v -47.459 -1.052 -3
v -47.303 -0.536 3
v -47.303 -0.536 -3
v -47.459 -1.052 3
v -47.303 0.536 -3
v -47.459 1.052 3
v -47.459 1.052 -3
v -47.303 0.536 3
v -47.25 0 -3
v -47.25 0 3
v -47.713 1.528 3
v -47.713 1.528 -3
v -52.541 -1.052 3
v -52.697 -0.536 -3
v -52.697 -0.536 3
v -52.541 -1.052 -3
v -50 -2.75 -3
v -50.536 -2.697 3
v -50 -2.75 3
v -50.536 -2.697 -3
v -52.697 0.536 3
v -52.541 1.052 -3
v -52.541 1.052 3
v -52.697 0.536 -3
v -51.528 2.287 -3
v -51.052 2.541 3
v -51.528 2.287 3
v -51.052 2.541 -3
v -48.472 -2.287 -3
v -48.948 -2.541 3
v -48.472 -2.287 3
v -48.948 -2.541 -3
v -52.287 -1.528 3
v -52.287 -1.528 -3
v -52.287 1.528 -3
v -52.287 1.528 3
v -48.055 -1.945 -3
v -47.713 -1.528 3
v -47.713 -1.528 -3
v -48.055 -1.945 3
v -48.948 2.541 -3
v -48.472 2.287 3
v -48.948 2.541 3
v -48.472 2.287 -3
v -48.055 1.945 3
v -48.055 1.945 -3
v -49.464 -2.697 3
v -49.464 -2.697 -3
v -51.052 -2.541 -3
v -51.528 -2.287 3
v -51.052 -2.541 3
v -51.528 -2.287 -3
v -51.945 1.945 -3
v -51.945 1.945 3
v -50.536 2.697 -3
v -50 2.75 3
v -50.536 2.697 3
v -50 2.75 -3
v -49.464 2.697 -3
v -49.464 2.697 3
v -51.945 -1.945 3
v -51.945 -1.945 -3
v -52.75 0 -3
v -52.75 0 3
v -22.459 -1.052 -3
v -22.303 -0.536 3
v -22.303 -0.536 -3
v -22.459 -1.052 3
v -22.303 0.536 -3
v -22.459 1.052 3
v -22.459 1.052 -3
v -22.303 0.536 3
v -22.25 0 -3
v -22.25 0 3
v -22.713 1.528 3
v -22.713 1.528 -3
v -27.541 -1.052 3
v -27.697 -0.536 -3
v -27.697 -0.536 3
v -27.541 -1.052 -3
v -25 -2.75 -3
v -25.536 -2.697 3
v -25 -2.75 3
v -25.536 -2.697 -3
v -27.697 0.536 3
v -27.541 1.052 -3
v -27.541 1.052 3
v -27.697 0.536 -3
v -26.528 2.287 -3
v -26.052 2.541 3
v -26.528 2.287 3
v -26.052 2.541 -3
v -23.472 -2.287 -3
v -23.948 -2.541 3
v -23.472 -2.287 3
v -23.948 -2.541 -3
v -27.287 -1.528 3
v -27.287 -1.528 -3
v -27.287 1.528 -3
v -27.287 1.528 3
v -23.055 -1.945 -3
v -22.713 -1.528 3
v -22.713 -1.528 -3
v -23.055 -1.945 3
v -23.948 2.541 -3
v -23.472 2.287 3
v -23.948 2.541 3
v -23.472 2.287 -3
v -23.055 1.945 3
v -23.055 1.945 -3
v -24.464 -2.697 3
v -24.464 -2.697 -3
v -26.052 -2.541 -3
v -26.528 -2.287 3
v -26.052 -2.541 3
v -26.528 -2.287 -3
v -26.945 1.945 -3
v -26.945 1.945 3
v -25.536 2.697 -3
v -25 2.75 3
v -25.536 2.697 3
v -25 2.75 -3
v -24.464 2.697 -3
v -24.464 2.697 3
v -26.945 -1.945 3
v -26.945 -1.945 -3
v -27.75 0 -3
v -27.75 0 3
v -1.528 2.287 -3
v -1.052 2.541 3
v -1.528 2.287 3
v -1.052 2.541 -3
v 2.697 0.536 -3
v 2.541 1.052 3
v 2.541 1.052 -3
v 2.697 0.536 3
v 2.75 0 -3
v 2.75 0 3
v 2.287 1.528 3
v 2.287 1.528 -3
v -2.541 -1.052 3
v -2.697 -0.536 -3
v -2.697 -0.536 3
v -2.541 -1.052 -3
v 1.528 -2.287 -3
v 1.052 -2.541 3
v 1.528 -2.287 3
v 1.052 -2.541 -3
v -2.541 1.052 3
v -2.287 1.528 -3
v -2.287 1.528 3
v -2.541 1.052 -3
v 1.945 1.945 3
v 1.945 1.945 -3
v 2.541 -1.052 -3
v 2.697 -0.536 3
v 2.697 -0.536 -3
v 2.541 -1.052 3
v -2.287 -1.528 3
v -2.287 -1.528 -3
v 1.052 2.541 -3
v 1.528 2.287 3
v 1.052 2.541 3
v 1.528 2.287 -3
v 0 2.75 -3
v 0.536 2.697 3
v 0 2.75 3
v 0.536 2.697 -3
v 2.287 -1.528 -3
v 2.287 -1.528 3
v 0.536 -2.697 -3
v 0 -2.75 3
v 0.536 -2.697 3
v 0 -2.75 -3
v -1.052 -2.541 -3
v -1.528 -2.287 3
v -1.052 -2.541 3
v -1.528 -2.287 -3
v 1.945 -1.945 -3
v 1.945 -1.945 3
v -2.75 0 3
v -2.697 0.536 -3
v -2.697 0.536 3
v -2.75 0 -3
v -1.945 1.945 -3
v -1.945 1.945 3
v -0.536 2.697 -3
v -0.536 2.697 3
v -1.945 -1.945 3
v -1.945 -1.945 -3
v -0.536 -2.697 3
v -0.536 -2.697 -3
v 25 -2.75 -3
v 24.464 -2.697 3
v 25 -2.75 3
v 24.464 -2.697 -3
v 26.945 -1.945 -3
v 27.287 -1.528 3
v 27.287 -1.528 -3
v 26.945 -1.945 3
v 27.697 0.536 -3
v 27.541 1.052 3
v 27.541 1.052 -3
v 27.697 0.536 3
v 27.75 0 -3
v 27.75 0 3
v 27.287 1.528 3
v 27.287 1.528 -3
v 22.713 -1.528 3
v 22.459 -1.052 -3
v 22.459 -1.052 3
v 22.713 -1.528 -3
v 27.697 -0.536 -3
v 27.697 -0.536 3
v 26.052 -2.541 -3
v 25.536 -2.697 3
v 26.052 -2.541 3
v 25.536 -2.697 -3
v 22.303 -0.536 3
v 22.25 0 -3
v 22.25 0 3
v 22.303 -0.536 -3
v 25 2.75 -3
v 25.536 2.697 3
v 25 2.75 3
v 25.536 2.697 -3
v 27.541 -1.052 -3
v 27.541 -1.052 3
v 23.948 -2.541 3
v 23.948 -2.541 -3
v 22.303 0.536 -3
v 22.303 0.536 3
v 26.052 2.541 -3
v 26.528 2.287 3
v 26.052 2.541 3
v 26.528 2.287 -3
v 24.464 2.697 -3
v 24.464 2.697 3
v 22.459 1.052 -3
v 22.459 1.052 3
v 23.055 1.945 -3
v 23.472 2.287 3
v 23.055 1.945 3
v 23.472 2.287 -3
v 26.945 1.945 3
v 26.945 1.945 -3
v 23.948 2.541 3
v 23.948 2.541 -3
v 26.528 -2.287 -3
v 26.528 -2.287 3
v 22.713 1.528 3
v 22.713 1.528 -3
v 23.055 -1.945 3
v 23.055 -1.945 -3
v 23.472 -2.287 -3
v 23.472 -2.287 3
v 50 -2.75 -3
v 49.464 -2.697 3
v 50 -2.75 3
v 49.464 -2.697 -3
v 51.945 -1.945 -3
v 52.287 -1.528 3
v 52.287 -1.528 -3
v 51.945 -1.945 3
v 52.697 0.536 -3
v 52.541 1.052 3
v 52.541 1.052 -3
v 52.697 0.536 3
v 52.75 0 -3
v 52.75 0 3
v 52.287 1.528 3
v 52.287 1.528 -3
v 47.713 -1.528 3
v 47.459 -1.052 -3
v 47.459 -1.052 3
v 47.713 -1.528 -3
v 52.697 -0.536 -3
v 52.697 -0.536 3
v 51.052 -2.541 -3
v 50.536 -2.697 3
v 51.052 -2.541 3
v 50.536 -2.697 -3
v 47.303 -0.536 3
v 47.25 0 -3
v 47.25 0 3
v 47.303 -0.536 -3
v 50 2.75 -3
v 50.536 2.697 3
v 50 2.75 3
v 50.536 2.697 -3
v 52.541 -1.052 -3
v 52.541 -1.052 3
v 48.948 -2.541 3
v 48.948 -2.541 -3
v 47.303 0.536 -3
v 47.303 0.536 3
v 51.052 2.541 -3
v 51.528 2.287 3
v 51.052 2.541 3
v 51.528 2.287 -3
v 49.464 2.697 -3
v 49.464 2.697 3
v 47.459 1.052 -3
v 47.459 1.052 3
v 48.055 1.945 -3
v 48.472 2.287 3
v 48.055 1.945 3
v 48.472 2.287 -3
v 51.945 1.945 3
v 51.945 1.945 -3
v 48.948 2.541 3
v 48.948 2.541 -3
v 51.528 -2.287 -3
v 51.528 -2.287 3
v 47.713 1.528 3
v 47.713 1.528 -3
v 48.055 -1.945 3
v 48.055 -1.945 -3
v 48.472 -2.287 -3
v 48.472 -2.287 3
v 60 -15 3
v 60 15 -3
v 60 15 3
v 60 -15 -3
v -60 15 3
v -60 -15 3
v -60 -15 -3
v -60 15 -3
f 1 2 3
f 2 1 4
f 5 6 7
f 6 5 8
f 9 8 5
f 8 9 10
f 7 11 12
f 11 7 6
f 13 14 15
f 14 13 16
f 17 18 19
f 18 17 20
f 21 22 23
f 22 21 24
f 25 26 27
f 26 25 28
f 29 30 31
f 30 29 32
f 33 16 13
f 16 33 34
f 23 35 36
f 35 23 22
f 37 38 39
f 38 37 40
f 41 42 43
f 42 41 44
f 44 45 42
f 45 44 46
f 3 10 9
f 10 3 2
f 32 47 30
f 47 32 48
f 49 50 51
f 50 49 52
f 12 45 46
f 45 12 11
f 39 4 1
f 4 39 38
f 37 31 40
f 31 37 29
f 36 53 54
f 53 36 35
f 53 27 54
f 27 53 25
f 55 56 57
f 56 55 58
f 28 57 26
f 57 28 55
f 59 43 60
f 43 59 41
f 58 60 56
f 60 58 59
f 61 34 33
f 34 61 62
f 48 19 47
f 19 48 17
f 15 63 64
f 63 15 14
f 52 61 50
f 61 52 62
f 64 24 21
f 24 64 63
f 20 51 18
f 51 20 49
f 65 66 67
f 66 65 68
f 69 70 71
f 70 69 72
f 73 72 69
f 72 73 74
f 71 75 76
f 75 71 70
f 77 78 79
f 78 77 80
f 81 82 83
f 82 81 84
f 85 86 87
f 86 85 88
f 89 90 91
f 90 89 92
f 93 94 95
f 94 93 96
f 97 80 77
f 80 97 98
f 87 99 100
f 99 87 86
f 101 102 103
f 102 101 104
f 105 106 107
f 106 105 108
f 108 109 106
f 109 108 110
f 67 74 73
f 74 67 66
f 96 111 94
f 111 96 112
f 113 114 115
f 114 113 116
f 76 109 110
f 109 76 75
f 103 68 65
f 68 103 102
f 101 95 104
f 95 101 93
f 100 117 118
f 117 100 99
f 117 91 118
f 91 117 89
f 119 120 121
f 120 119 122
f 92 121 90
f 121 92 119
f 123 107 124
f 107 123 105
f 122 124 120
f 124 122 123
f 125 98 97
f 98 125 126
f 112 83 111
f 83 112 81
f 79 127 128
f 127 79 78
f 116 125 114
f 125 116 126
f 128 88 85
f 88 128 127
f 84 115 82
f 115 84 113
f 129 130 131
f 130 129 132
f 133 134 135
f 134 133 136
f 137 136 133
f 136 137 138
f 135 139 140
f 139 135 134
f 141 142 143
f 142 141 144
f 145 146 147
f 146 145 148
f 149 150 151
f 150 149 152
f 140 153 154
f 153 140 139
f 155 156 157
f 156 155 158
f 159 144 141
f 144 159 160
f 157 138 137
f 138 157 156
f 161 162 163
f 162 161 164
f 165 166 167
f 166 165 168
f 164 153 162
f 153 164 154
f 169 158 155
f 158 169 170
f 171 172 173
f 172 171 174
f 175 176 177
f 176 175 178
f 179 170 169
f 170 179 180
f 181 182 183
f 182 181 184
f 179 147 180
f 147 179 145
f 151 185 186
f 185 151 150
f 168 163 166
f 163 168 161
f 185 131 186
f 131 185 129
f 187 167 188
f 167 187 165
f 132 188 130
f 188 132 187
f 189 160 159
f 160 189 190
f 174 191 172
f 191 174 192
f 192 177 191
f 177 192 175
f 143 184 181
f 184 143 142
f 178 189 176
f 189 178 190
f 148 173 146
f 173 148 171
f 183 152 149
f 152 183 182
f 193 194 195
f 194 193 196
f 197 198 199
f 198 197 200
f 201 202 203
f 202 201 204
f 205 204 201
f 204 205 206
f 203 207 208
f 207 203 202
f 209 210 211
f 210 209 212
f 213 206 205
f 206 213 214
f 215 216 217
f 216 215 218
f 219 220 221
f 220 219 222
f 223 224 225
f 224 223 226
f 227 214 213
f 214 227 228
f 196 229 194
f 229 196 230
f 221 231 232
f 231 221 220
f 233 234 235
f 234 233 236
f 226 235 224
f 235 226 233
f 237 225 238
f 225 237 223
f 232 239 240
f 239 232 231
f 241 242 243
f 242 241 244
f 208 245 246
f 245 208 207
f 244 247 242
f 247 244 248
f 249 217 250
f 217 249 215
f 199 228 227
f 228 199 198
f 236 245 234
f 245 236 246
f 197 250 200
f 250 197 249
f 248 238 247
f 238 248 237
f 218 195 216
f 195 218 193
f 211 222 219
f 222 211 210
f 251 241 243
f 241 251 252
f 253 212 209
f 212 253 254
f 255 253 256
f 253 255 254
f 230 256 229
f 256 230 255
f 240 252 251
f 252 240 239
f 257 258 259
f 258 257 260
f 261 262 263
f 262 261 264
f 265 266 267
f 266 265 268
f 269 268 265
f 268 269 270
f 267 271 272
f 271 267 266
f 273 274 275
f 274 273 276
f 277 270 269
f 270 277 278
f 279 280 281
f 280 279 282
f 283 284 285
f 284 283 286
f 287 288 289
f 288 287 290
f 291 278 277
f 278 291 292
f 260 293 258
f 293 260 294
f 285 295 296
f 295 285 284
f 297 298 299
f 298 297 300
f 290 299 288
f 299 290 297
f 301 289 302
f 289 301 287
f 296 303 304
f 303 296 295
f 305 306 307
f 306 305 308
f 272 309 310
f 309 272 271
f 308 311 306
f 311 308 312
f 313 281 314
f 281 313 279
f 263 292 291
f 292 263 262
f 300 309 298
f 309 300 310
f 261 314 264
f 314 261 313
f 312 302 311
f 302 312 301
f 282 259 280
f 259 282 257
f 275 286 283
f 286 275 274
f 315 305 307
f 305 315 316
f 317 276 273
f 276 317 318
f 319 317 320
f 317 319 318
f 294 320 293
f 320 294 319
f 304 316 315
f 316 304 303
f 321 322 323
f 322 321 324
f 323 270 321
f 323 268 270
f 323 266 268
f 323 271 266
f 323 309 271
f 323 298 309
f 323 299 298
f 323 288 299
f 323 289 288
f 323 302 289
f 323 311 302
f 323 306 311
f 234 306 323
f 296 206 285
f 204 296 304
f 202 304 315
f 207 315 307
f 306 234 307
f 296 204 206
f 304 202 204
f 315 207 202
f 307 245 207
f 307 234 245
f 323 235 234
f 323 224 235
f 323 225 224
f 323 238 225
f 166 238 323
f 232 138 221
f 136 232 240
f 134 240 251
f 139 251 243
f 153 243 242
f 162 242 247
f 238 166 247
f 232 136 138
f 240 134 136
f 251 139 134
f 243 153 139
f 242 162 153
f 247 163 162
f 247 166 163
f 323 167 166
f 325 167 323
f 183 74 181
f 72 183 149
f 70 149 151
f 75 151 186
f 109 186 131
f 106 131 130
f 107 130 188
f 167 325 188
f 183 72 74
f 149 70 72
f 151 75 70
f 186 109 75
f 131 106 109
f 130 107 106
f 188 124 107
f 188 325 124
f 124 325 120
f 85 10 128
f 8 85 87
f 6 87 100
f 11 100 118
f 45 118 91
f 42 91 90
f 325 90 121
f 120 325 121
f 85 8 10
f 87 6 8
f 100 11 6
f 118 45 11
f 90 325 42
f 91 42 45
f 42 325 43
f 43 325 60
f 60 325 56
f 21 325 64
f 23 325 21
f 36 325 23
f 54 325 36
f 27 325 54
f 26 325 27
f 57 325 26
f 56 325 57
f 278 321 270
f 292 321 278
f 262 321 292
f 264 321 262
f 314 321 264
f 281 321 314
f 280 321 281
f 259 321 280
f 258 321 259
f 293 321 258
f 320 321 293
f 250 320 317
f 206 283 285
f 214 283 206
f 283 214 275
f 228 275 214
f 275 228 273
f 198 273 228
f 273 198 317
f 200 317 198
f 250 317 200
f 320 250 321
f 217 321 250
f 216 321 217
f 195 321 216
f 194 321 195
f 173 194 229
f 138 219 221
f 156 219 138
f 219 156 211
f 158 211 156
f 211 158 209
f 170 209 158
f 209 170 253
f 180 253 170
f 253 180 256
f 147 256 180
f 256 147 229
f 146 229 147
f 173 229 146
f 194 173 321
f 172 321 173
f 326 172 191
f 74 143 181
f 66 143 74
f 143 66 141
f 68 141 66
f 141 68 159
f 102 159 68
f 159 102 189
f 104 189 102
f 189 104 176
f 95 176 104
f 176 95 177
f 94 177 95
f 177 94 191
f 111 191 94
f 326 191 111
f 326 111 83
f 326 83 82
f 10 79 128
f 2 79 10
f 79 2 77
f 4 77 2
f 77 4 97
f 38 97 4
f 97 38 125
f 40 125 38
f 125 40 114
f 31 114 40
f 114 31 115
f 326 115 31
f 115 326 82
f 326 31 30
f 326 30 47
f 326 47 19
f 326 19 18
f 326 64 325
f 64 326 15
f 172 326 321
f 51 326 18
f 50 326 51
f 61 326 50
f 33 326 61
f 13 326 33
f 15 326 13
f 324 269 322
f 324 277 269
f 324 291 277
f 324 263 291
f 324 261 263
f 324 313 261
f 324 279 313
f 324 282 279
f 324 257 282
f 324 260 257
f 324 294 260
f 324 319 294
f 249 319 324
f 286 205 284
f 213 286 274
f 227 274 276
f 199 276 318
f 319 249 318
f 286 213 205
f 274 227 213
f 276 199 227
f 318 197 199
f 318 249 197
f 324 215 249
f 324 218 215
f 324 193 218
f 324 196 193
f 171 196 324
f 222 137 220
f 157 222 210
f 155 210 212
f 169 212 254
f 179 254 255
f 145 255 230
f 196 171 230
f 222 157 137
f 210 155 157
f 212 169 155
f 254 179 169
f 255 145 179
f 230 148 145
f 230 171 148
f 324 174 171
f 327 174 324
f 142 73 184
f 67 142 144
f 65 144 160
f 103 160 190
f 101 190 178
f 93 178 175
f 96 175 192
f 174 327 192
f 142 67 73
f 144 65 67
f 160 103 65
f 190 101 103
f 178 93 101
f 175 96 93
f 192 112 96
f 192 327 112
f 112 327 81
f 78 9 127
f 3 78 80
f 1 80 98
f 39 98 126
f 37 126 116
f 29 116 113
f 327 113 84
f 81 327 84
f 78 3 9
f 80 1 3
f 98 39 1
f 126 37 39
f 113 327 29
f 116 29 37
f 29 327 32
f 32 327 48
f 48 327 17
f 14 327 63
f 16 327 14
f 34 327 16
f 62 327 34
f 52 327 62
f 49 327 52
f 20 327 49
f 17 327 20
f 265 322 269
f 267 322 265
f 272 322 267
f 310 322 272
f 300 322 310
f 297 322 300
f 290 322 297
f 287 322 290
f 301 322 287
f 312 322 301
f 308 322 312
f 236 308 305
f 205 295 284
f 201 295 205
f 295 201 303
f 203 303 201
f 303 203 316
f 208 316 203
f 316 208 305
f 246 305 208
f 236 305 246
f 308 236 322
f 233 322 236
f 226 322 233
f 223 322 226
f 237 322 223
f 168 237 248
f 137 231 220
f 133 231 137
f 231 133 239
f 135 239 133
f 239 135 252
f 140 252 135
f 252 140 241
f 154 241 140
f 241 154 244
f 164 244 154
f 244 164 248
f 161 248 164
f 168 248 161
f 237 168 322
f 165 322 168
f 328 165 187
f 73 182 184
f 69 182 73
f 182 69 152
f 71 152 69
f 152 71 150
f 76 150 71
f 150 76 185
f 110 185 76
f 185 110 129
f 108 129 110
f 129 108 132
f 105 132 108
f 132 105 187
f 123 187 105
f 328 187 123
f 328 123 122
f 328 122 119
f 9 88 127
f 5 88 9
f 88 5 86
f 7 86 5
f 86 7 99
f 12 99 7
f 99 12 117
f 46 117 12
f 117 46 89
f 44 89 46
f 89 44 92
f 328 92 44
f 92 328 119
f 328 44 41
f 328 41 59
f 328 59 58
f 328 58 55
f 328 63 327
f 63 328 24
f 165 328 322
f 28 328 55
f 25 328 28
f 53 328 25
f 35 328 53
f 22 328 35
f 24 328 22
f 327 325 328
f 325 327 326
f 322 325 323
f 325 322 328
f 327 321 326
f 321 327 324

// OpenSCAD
$fn = 32;

// ----------------------------------------------------------------------
// Hole bar, 5 x Ø5.5
// row layout, 10 mm edge offset
// ----------------------------------------------------------------------

// --- parameters (mm) ---
bar_w = 30;    // bar width (Y)
bar_t = 6;     // bar thickness (Z)
holes = 5;     // holes per row
hole_d = 5.5;  // hole diameter
edge = 10;     // offset from the bar end to the first hole
pitch = 25;    // pitch between neighbouring holes

// --- derived feature positions (mm) ---
span = (holes - 1) * pitch;   // = 100   distance between the end holes
bar_l = span + 2 * edge;      // = 120   overall bar length
start_x = -bar_l / 2 + edge;  // = -50   X of the first hole
feature_centers = [
  [start_x + 0 * pitch, 0],
  [start_x + 1 * pitch, 0],
  [start_x + 2 * pitch, 0],
  [start_x + 3 * pitch, 0],
  [start_x + 4 * pitch, 0]
];   // hole centres of the first row

// bar with one row of holes, drilled from feature_centers
difference() {
  translate([-bar_l / 2, -bar_w / 2, -bar_t / 2]) cube([bar_l, bar_w, bar_t]);
  for (centre = feature_centers)
    translate([centre[0], centre[1], 0])
      cylinder(d = hole_d, h = bar_t + 2, center = true);
}
